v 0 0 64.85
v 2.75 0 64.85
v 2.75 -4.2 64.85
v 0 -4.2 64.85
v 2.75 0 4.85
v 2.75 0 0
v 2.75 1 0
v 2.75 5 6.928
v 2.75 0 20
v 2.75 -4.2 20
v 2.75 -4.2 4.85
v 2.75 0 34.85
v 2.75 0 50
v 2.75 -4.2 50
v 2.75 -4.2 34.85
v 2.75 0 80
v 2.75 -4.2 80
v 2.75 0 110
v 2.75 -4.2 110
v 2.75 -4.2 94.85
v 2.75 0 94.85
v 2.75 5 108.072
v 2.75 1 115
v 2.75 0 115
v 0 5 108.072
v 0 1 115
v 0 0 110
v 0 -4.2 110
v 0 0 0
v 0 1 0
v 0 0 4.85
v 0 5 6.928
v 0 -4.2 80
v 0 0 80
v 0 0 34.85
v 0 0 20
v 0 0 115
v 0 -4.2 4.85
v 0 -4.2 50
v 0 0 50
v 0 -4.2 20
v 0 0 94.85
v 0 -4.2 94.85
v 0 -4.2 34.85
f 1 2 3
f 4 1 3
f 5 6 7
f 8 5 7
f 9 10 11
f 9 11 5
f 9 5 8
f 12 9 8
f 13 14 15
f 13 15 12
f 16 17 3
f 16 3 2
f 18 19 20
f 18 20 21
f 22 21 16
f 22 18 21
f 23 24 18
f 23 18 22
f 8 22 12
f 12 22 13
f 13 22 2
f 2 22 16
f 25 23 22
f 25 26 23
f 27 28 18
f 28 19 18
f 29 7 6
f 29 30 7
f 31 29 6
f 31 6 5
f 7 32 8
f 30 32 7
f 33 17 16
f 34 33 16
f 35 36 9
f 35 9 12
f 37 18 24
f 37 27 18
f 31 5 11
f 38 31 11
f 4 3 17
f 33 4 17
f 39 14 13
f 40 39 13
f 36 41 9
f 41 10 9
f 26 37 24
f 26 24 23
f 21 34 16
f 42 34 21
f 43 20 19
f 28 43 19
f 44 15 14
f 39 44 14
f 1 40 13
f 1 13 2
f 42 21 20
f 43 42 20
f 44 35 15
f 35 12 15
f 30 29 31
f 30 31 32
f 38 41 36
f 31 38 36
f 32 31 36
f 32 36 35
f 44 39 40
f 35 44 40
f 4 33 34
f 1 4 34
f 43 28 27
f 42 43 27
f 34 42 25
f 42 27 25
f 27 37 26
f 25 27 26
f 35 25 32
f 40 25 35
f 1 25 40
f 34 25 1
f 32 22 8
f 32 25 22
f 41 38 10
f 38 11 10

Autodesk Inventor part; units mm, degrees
ref_plane "YZ Plane" through (0, 0, 0) normal (1, 0, 0) x (0, 1, 0)
ref_plane "XZ Plane" through (0, 0, 0) normal (0, 1, 0) x (-1, 0, 0)
ref_plane "XY Plane" through (0, 0, 0) normal (0, 0, 1) x (1, 0, 0)
sketch "Sketch1" plane through (0, 0, 0) normal (1, 0, 0) x (0, 1, 0)
  line L0 (0, 0) -> (0, 115)
  line L1 (0, 115) -> (1, 115)
  line L2 (1, 115) -> (5, 108.0718)
  line L3 (5, 108.0718) -> (5, 6.9282)
  line L4 (5, 6.9282) -> (1, 0)
  line L5 (1, 0) -> (0, 0)
  line L6 (1, 115) -> (1, 0) construction
  dimension "d0" = 1
  dimension "d1" = 4
  dimension "d2" = 30
  dimension "d3" = 115
extrude "Extrusion1" add sketch "Sketch1" along normal blind 2.75
sketch "Sketch2" plane through (2.75, 0, 0) normal (1, 0, 0) x (0, 0, -1)
  line L0 (-115, 0) -> (0, 0) projected
  line L1 (-110, 0) -> (-94.85, 0)
  line L2 (-94.85, 0) -> (-94.85, -4.2)
  line L3 (-94.85, -4.2) -> (-110, -4.2)
  line L4 (-110, -4.2) -> (-110, 0)
  line L5 (-80, 0) -> (-64.85, 0)
  line L6 (-64.85, 0) -> (-64.85, -4.2)
  line L7 (-64.85, -4.2) -> (-80, -4.2)
  line L8 (-80, -4.2) -> (-80, 0)
  line L9 (-50, 0) -> (-34.85, 0)
  line L10 (-34.85, 0) -> (-34.85, -4.2)
  line L11 (-34.85, -4.2) -> (-50, -4.2)
  line L12 (-50, -4.2) -> (-50, 0)
  line L13 (-20, 0) -> (-4.85, 0)
  line L14 (-4.85, 0) -> (-4.85, -4.2)
  line L15 (-4.85, -4.2) -> (-20, -4.2)
  line L16 (-20, -4.2) -> (-20, 0)
  dimension "d6" = 15.15
  dimension "d7" = 15.15
  dimension "d8" = 15.15
  dimension "d9" = 15.15
  dimension "d10" = 4.2
  dimension "d11" = 5
  dimension "d12" = 30
  dimension "d13" = 30
  dimension "d14" = 30
extrude "Extrusion2" add sketch "Sketch2" against normal up to surface (2.75 mm away)
equation "\"d7\" = d6"
equation "\"d8\" = d6"
equation "\"d9\" = d6"
equation "\"d13\" = d12"
equation "\"d14\" = d12"
properties part number "TrayPanelH"
